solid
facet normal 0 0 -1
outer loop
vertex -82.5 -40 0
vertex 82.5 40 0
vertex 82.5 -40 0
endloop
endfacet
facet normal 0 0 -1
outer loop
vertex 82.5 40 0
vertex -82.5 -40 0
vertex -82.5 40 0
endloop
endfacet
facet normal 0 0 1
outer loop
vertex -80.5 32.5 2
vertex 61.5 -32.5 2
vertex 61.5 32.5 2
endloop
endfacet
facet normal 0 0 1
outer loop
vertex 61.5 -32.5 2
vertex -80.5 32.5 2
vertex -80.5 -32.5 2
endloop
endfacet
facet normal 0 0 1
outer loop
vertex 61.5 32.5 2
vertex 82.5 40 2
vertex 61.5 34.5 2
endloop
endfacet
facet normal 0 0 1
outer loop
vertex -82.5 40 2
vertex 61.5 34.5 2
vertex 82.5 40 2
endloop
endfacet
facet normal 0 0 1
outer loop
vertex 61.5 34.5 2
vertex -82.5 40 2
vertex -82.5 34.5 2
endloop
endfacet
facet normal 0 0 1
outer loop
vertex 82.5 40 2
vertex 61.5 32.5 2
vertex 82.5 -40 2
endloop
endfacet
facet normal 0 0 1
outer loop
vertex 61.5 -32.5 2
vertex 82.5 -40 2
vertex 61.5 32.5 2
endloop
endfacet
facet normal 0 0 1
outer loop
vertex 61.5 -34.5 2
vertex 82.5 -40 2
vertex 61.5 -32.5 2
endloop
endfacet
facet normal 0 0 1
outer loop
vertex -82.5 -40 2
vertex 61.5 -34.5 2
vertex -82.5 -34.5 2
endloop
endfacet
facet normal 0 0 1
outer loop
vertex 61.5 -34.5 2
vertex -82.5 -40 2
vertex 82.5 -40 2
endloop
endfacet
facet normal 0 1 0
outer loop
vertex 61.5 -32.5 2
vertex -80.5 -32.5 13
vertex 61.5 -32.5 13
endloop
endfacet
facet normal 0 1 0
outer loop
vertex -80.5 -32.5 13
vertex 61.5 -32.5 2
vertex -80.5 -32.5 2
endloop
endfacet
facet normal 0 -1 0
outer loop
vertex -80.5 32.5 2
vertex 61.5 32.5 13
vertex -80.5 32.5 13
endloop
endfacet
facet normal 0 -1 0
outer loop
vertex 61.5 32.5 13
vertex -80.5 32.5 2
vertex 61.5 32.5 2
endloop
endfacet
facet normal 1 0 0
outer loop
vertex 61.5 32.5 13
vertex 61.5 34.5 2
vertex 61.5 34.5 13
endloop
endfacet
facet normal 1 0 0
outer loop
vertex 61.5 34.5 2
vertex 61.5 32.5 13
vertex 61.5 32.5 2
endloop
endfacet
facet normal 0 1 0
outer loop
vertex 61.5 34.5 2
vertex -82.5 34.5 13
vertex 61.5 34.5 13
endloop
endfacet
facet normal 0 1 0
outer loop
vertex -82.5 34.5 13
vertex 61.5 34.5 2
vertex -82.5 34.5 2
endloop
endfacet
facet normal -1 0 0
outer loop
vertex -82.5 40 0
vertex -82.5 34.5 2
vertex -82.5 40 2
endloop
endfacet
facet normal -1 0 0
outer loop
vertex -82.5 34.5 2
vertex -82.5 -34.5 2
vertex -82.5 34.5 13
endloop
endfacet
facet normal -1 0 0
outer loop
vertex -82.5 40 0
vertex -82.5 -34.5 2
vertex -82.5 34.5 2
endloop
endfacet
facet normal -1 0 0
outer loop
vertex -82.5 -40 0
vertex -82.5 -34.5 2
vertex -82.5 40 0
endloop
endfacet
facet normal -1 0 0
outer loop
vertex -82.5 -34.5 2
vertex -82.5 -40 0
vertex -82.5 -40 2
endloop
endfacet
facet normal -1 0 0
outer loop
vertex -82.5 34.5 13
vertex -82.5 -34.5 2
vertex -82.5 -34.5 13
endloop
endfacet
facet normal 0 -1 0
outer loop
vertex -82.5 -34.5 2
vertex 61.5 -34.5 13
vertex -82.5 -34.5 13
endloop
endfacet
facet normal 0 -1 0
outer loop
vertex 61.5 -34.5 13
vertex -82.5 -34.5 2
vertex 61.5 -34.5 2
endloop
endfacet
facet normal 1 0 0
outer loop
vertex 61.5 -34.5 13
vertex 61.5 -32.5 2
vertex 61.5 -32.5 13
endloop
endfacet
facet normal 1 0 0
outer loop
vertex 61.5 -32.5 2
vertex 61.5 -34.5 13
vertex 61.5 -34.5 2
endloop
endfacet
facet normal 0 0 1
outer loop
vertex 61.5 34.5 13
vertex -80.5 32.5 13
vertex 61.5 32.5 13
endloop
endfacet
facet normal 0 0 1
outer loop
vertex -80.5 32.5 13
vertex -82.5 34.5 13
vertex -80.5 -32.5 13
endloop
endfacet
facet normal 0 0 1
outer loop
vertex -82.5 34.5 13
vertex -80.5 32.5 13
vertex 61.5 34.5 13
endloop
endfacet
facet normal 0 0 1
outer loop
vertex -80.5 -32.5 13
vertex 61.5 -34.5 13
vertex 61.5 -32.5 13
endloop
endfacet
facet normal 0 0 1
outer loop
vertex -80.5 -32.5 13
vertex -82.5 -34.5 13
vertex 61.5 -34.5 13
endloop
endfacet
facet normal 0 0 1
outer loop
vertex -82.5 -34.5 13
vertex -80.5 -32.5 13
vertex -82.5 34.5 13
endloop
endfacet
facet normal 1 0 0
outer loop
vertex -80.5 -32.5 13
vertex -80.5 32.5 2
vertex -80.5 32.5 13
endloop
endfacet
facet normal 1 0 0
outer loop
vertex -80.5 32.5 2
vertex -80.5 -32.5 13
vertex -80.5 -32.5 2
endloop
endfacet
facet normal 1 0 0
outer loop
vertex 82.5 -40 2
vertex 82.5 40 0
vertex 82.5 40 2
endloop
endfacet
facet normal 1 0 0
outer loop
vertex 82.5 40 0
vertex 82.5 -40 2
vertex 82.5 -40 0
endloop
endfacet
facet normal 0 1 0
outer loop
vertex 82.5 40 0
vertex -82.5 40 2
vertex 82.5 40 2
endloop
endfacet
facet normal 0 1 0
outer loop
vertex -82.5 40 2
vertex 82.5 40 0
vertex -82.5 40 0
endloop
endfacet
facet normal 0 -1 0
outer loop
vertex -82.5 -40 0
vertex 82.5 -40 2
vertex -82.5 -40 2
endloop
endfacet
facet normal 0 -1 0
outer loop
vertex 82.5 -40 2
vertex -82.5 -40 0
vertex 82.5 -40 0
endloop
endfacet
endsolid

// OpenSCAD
// file: chassis.scad
module chassis_base(size, angle) {
    difference() {
        square(size, true);

        union() {
            translate([size[0]/2,size[1]/2,0]) rotate([0,0,45]) square(angle, true);
            translate([size[0]/2,-size[1]/2,0]) rotate([0,0,45]) square(angle, true);

            translate([-size[0]/2,size[1]/2,0]) rotate([0,0,45]) square(angle, true);
            translate([-size[0]/2,-size[1]/2,0]) rotate([0,0,45]) square(angle, true);
        }
    }
}

module chassis_bottom() {
    union() {
        linear_extrude(height=base_thickness) chassis_base(chassis_size, chassis_corner_angle);

        translate([0,0,base_thickness]) linear_extrude(height=wall_height) difference() {
            chassis_base(chassis_size, chassis_corner_angle);
            offset(delta=-wall_thickness) chassis_base(chassis_size, chassis_corner_angle);
        }
    }
}

module chassis_mid() {
    linear_extrude(height=base_thickness) chassis_base(cover_size, 5);
}
// file: mounts.scad
function sq2poly(size) = [[0,0], [0,size[1]], [size[0],size[1]], [size[0],0]];

// Screw hole and standoff
module mount_standoff(inner, outer, brace_count = 2, brace_size = 8) {
    rotate([0,0,-90]) union() {
        difference() {
            cylinder(d=outer, h=wall_height);
            cylinder(d=inner, h=wall_height+1);
        }

        // Add in stand off corner supports
        for (i = [0:brace_count-1]) {
            rotate([0,0,i*90]) translate([-1.5,brace_size+2,0]) rotate([180,-90,0])
                linear_extrude(height=3)
                    polygon(points = [[0,0], [0,brace_size], [wall_height,brace_size], [0,0]]);
        }
    }
}

// The mounting plate
module basic_mount(dim, standoff_size, hole_inset, brace_count = 4) {
    translate([-dim[0]/2, -dim[1]/2, 0]) difference() {
        union() {
            linear_extrude(height=base_thickness) {
                offset(delta=wall_thickness) square(dim);
            }

            // Add the wall
            translate([0,0,base_thickness]) linear_extrude(height=wall_height/2) {
                difference() {
                    offset(delta=wall_thickness) square(dim);
                    square(dim);
                }
            }

            // Odd the standoffs
            for (x=[0:3]) {
                poly = sq2poly(dim);
                position = poly[x];
                translate([position[0], position[1], 0]) {
                    rotate([0,0,x*-90]) {
                        translate([hole_inset, hole_inset, base_thickness]) {
                            mount_standoff(standoff_size[0], standoff_size[1], brace_count);
                        }
                    }
                }
            }
        }
    }
}

module single_hole_mount(dim, standoff_size, hole_location, brace_count) {
    translate([-dim[0]/2, -dim[1]/2, 0]) {
        union() {
            linear_extrude(height=base_thickness) {
                offset(delta=wall_thickness) square(dim);
            }

            // Add the wall
            translate([0,0,base_thickness]) linear_extrude(height=wall_height/2) {
                difference() {
                    offset(delta=wall_thickness) square(dim);
                    square(dim);
                }
            }

            // Odd the standoff
            translate([hole_location[0], hole_location[1], base_thickness])
                mount_standoff(standoff_size[0], standoff_size[1], brace_count, 4);
        }
    }
}

module pi_mount() {
    basic_mount(pi_zero_dim, pi_zero_standoff_size, pi_zero_hole_inset, 2);
}

module motor_controller_mount() {
    basic_mount(motor_controller_dim, motor_controller_standoff_size, motor_controller_hole_inset, 2);
}

module gearbox_mount() {
    mount_base_thickness = base_thickness+wall_height;
    mount_length = 15;
    mount_width = base_thickness;
    mount_height = gear_box_dim[2]+base_thickness+wall_height;
    mount_hole_base_height = mount_base_thickness + gear_box_mount_diameter/2 + gear_box_hole_distance_from_base;

    union() {
        translate([0,0,base_thickness/2 + wall_height/2])
            cube([gear_box_dim[0], gear_box_dim[1], mount_base_thickness], true);

        translate([0, gear_box_dim[1]/2, 0]) {
            difference() {
                translate([0,mount_width/2,mount_height/2]) cube([mount_length, mount_width, mount_height], true);

                translate([0,base_thickness/2,mount_hole_base_height])
                    rotate([90,0,0])
                        cylinder(r=gear_box_mount_diameter/2, h=base_thickness*3, center=true);

                translate([0,base_thickness/2, mount_hole_base_height + gear_box_mount_hole_spacing])
                    rotate([90,0,0])
                        cylinder(r=gear_box_mount_diameter/2, h=base_thickness*3, center=true);
            }
        }

        translate([-base_thickness/2 + mount_length/2,gear_box_dim[1]/2 + mount_width*wall_height/2,mount_height/2])
            cube([base_thickness, wall_height, mount_height], true);

        translate([base_thickness/2 - mount_length/2,gear_box_dim[1]/2 + mount_width*wall_height/2,mount_height/2])
            cube([base_thickness, wall_height, mount_height], true);
    }
}

module ir_sensor_mount() {
    union () {
        linear_extrude(height=base_thickness) square(ir_proximity_dim, true);

        translate([0,ir_proximity_dim[1]/2 + wall_thickness/2,(base_thickness + wall_height+2)/2])
            cube([ir_proximity_dim[0], wall_thickness, base_thickness + wall_height+2], true);

        translate([0,-ir_proximity_dim[1]/2 - wall_thickness/2,(base_thickness + wall_height+2)/2])
            cube([ir_proximity_dim[0], wall_thickness, base_thickness + wall_height+2], true);

        translate([ir_proximity_dim[0]/2 - ir_proximity_hole_location,0,base_thickness])
            mount_standoff(ir_proximity_standoff_size[0], ir_proximity_standoff_size[1], 4, ir_proximity_dim[1]/3);
    }
}

module battery_mount() {
    battery_to_edge = (cover_size[1] - battery_dim[1] - wall_thickness*2) / 2;

    union() {
        translate([0,0,base_thickness/2]) cube([cover_size[0], cover_size[1], base_thickness], true);

        translate([-(cover_size[0]/2 - battery_dim[0]/2 - wall_thickness),0,0]) {
            linear_extrude(height=base_thickness) {
                difference() {
                    offset(delta=wall_thickness) square([battery_dim[0], battery_dim[1]], true);
                    translate([battery_dim[0]/2 - 20, 0, 0]) square([50, battery_dim[1]], true);
                }
            }

            translate([0,0,base_thickness]) linear_extrude(height=battery_dim[2]/2) difference() {
                offset(delta=wall_thickness) square([battery_dim[0], battery_dim[1]], true);
                square([battery_dim[0], battery_dim[1]], true);
                translate([wall_thickness*2, 0, 0]) square([battery_dim[0], battery_dim[1]], true);
            }
        }
    }
}
// main file
include <mounts.scad>;
include <chassis.scad>;

/////////////////////////
// CUSTOMIZABLE THINGS //
/////////////////////////

// Global information
base_thickness = 2;
wall_thickness = 2;
wall_height = 3;

// Chassis information
chassis_size = [170, 100];
chassis_corner_angle = 15;

// Motor and gearbox information
gear_box_dim = [66,18.5,24];
gear_box_mount_diameter = 3.5;
gear_box_hole_distance_from_base = .75;
gear_box_mount_hole_spacing = 18;

// Mount information
pi_zero_dim = [65, 30];
pi_zero_hole_inset = 3.5;
pi_zero_standoff_size = [2.5,6];

motor_controller_dim = [44, 44];
motor_controller_hole_inset = 3.5;
motor_controller_standoff_size = [3,7];

ir_proximity_dim = [31, 15];
ir_proximity_height = 7;
ir_proximity_hole_location = 7;
ir_proximity_standoff_size = [3,7];

battery_dim = [140, 65, 22];

plate_hole_diameter = 3.5;

tallest_component_height = 27; // Usually the heatsink of the motor controller

// Curve smoothness
$fn=45; // This can greatly increase render time

////////////////////////////////////////////
// DO NOT CHANGE ANYTHING BELOW THIS LINE //
////////////////////////////////////////////

// Standoff information
level_one_height = tallest_component_height + wall_height*2 + ir_proximity_height + 5;

// Get the hood size based on the chassis size.
cover_size = [chassis_size[0] - 5, chassis_size[1] - 20];

standoff_translate = [
    cover_size[0]/2 - 2.5 - 5,
    cover_size[1]/2 - 2.5 - 5
];

module plate_standoff(height) {
    inner_hole_depth = max(height / 5, 12);

    difference() {
        cylinder(d=6, h=height, $fn=6);
        cylinder(d=3, h=inner_hole_depth, $fn=45);
        translate([0,0,height - inner_hole_depth]) cylinder(d=3, h=inner_hole_depth);
    }
}

// Primary plate that everything is build on top of.
module bottom_plate() {
    difference() {
        union() {
            // Bring in the base plate to build on top of.
            chassis_bottom();

            // Add the pi mount and move to the side slightly to make room for usb cables.
            translate([0,motor_controller_dim[1]/2 - pi_zero_dim[1]/2,0]) pi_mount();

            // Add the motor controller mounts
            motor_controller_translate = [chassis_size[0]/2-motor_controller_dim[0]/2-wall_thickness,0,0];
            for (i = [-1,1]) {
                translate(i*motor_controller_translate) motor_controller_mount();
            }

            // Add in the motor mounts
            x_gear_box_translate = chassis_size[0]/2 - gear_box_dim[0]/2 - chassis_corner_angle/2 - wall_thickness * 3;
            y_gear_box_translate = chassis_size[1]/2-gear_box_dim[1]/2;

            translate([x_gear_box_translate,y_gear_box_translate,0])
                rotate([0,0,180]) gearbox_mount(gear_box_dim);

            translate([-x_gear_box_translate,y_gear_box_translate,0])
                rotate([0,0,180]) gearbox_mount(gear_box_dim);

            translate([x_gear_box_translate, -y_gear_box_translate,0])
                gearbox_mount(gear_box_dim);

            translate([-x_gear_box_translate, -y_gear_box_translate,0])
                gearbox_mount(gear_box_dim);
        }

        union() {
            translate([standoff_translate[0],standoff_translate[1],0]) cylinder(d=plate_hole_diameter, h=base_thickness*2);
            translate([standoff_translate[0],-standoff_translate[1],0]) cylinder(d=plate_hole_diameter, h=base_thickness*2);
            translate([-standoff_translate[0],-standoff_translate[1],0]) cylinder(d=plate_hole_diameter, h=base_thickness*2);
            translate([-standoff_translate[0],standoff_translate[1],0]) cylinder(d=plate_hole_diameter, h=base_thickness*2);
            translate([0,-standoff_translate[1],0]) cylinder(d=plate_hole_diameter, h=base_thickness*2);
            translate([0,standoff_translate[1],0]) cylinder(d=plate_hole_diameter, h=base_thickness*2);
        }
    }
}

module mid_plate_base() {
    difference() {
        chassis_mid();

        union() {
            translate([standoff_translate[0],standoff_translate[1],0]) cylinder(d=plate_hole_diameter, h=base_thickness*2);
            translate([standoff_translate[0],-standoff_translate[1],0]) cylinder(d=plate_hole_diameter, h=base_thickness*2);
            translate([-standoff_translate[0],-standoff_translate[1],0]) cylinder(d=plate_hole_diameter, h=base_thickness*2);
            translate([-standoff_translate[0],standoff_translate[1],0]) cylinder(d=plate_hole_diameter, h=base_thickness*2);
            translate([0,-standoff_translate[1],0]) cylinder(d=plate_hole_diameter, h=base_thickness*2);
            translate([0,standoff_translate[1],0]) cylinder(d=plate_hole_diameter, h=base_thickness*2);

            // Cut a notch in end for cables to run from battery.
            translate([cover_size[0]/2 - 20,0,0]) {
                linear_extrude(height=base_thickness) {
                    hull() {
                        square([1, 5], true);
                        translate([15, 0, 0]) square([10, 15], true);
                    }
                }
            }
        }
    }
}

module middle_plate() {
    ir_standoff_translate = [
        cover_size[0]/2 - ir_proximity_dim[0]/2,
        cover_size[1]/2 - ir_proximity_dim[1]/2 - cover_size[1]/6,
        0
    ];

    union() {
        mid_plate_base();

        translate(ir_standoff_translate)
            rotate([0,0,180]) ir_sensor_mount();

        translate([ir_standoff_translate[0], -ir_standoff_translate[1], ir_standoff_translate[2]])
            rotate([0,0,180]) ir_sensor_mount();

        translate([-ir_standoff_translate[0], -ir_standoff_translate[1], ir_standoff_translate[2]])
            ir_sensor_mount();

        translate([-ir_standoff_translate[0], ir_standoff_translate[1], ir_standoff_translate[2]])
            ir_sensor_mount();
    }
}

module top_plate() {
    union() {
        mid_plate_base();
        battery_mount();
    }
}

module pi_bot() {
    union() {
        bottom_plate();

        translate([standoff_translate[0],standoff_translate[1],base_thickness]) plate_standoff(level_one_height);
        translate([standoff_translate[0],-standoff_translate[1],base_thickness]) plate_standoff(level_one_height);
        translate([-standoff_translate[0],-standoff_translate[1],base_thickness]) plate_standoff(level_one_height);
        translate([-standoff_translate[0],standoff_translate[1],base_thickness]) plate_standoff(level_one_height);
        translate([0,-standoff_translate[1],base_thickness]) plate_standoff(level_one_height);
        translate([0,standoff_translate[1],base_thickness]) plate_standoff(level_one_height);

        translate([0,0,level_one_height+base_thickness]) rotate([180, 0, 0]) middle_plate();
    }
}

// pi_bot();
// motor_controller_mount();
// middle_plate();
// top_plate();
battery_mount();
// ir_sensor_mount();
// bottom_plate();
// gearbox_mount();
// plate_standoff(level_one_height);
